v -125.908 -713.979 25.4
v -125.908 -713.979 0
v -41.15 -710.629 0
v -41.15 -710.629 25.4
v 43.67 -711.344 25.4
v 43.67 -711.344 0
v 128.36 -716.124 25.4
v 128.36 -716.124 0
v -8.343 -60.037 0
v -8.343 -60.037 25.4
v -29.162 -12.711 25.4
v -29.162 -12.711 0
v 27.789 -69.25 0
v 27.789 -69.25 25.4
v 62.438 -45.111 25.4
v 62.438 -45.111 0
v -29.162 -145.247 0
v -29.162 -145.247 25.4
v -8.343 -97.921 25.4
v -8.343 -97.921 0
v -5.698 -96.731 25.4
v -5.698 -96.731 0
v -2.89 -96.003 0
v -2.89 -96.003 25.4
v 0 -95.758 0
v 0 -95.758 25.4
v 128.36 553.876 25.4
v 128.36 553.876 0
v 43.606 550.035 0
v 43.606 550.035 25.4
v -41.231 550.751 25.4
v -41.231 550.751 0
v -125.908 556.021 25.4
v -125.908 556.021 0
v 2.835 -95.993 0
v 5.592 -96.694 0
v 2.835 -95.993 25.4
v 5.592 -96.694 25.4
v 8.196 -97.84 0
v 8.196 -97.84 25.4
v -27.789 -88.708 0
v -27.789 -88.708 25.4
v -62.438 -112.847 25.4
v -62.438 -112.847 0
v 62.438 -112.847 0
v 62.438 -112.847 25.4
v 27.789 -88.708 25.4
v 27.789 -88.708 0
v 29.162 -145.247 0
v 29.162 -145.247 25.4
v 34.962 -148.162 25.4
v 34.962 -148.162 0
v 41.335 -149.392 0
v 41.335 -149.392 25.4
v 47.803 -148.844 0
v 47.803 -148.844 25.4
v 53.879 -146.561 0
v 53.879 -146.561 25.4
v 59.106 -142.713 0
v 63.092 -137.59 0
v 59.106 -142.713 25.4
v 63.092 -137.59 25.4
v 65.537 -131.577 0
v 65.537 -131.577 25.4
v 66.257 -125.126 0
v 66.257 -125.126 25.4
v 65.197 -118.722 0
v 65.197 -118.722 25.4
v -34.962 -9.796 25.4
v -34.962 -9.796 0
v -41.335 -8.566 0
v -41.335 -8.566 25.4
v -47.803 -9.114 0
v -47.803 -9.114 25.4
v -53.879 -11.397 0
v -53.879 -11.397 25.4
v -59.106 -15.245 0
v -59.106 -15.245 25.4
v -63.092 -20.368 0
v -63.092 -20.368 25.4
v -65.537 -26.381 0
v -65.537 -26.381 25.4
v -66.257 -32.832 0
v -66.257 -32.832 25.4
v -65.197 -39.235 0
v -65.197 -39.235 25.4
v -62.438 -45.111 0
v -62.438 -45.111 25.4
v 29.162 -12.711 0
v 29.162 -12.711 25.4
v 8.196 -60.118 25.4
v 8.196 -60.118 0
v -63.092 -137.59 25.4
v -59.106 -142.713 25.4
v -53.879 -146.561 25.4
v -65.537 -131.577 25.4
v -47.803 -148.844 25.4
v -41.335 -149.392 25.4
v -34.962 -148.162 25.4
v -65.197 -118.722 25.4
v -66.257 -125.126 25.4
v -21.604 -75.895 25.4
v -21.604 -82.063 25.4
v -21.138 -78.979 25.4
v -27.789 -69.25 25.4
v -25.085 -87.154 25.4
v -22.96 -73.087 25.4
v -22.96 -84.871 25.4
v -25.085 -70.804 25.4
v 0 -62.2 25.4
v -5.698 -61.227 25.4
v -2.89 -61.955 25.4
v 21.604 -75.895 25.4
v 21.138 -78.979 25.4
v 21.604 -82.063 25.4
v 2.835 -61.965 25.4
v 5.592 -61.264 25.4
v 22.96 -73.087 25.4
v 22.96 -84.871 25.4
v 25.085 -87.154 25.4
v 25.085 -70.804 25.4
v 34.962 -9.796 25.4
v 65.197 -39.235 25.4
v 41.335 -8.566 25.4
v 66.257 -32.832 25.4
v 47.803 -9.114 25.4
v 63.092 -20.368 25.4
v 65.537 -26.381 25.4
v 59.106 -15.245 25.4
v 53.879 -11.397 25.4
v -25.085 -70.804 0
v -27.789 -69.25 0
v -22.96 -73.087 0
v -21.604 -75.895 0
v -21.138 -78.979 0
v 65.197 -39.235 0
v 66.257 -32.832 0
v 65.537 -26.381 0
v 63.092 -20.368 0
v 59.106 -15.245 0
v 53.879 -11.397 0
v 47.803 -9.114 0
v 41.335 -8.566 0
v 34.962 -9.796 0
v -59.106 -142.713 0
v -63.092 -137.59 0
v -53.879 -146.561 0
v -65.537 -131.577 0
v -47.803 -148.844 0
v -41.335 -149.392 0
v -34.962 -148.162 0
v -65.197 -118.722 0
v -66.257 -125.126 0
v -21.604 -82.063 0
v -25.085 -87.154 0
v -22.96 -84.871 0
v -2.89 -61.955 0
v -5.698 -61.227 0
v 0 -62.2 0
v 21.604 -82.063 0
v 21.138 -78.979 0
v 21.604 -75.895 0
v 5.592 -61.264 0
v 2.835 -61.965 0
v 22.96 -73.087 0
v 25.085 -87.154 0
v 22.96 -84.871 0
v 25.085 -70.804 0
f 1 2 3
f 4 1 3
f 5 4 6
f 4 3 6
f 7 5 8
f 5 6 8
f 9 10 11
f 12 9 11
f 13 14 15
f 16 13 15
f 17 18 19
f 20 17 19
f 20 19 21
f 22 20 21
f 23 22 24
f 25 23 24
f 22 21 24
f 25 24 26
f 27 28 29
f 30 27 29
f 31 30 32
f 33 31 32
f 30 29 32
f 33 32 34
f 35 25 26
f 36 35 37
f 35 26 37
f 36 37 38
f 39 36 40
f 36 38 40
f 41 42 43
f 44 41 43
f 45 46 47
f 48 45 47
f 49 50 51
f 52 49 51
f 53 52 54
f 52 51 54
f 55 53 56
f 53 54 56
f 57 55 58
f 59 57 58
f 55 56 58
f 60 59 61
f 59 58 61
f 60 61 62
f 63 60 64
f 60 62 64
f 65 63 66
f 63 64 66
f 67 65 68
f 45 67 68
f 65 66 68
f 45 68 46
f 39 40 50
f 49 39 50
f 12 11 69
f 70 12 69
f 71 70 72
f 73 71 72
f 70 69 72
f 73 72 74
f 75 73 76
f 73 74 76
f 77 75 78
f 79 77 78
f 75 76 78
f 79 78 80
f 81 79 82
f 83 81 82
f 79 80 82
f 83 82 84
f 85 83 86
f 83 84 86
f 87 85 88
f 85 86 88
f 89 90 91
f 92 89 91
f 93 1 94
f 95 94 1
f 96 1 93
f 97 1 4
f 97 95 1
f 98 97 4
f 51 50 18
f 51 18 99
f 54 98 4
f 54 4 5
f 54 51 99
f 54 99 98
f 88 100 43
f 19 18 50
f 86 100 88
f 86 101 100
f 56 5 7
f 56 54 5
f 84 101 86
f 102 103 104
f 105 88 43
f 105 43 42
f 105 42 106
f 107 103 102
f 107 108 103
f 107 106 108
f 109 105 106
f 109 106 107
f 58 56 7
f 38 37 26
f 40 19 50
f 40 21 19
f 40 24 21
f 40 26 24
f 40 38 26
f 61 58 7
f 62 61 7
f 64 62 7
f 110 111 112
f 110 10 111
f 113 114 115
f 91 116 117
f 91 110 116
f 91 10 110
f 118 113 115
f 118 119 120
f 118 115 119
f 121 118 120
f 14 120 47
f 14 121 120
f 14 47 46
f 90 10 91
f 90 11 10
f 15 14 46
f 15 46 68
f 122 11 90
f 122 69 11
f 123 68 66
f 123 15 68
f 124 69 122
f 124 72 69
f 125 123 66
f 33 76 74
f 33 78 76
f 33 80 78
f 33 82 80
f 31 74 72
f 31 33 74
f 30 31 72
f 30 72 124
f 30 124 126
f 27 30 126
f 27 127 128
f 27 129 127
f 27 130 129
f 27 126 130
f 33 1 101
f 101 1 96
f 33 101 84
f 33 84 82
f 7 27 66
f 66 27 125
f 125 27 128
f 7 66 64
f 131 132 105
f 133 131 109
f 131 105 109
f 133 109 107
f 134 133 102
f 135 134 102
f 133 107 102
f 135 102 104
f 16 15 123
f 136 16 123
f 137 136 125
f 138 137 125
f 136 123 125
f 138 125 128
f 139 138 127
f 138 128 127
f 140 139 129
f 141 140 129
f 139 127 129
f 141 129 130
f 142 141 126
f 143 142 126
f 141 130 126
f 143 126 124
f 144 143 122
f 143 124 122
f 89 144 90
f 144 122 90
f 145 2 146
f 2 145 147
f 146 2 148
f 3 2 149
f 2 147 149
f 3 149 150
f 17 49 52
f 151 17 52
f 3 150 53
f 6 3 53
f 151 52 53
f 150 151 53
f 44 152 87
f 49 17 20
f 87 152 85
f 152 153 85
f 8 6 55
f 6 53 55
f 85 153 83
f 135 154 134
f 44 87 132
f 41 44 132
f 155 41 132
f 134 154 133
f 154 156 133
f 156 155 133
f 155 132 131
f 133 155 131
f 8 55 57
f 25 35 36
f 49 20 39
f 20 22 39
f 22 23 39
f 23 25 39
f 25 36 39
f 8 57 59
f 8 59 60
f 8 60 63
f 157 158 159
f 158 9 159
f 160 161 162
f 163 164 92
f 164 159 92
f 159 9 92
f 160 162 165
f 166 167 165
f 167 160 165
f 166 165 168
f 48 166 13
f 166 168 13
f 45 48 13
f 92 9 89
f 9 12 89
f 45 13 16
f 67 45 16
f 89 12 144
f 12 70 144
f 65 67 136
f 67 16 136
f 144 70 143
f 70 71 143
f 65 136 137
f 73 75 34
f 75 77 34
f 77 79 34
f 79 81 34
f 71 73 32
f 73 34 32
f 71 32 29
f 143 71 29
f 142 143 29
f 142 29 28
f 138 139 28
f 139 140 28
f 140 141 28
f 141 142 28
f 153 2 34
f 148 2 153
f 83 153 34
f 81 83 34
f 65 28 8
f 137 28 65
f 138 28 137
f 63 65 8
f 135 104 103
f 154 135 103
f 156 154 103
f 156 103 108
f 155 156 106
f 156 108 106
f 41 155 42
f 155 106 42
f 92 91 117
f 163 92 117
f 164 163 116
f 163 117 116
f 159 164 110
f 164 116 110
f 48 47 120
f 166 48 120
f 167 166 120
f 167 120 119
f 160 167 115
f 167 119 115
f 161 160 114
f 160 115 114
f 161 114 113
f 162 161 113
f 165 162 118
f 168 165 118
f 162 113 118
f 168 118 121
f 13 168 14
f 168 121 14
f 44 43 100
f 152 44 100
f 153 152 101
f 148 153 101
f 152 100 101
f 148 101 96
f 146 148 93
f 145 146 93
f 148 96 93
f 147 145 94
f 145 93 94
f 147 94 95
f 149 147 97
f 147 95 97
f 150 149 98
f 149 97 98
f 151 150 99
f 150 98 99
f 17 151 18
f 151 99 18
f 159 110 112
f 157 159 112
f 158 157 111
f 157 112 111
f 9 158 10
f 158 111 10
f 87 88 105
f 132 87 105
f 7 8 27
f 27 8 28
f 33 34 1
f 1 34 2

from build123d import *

# Parameters (mm, degrees)
F1_DEPTH = 25.4
F3_DEPTH = 25.4
F4_DEPTH = 25.4


# Not quite as in the source:
# - a feature names something its author has since deleted; it is built from what else it names


with BuildPart() as f1:
    # F0 (on Top) → F1 (new body)
    with BuildSketch(Plane.XY):
        with BuildLine():
            ThreePointArc((128.3595710993, 553.8759422302), (1.1825358552, 549.8230168828), (-125.9080190212, 556.0210293531))
            Line((-125.9080190212, 556.0210293531), (-125.9080190212, -713.9789706469))
            ThreePointArc((-125.9080190212, -713.9789706469), (1.2643600135, -710.4779684085), (128.3595710993, -716.1240577698))
            Line((128.3595710993, -716.1240577698), (128.3595710993, 553.8759422302))
        make_face()
    extrude(amount=F1_DEPTH)

    # F2 (on face) → F3 (cut, through all)
    with BuildSketch(Plane.XY.offset(25.4)):
        with BuildLine():
            Line((21.1381499791, -78.9789706469), (0, -78.9789706469))
            Line((0, -78.9789706469), (0, -95.7576301918))
            ThreePointArc((0, -95.7576301918), (4.2283594629, -96.2864641581), (8.1962319091, -97.8403873742))
            Line((8.1962319091, -97.8403873742), (29.1618719602, -145.247048063))
            ThreePointArc((29.1618719602, -145.247048063), (59.1063769686, -142.7132397651), (62.4383196322, -112.8470092903))
            Line((62.4383196322, -112.8470092903), (27.7889794812, -88.7078500401))
            ThreePointArc((27.7889794812, -88.7078500401), (22.9597605864, -84.8714367544), (21.1381499791, -78.9789706469))
        make_face()
        with BuildLine():
            Line((0, -78.9789706469), (-21.1381499791, -78.9789706469))
            ThreePointArc((-21.1381499791, -78.9789706469), (-22.9597605864, -84.8714367544), (-27.7889794812, -88.7078500401))
            Line((-27.7889794812, -88.7078500401), (-62.4383196322, -112.8470092903))
            ThreePointArc((-62.4383196322, -112.8470092903), (-59.1063769686, -142.7132397651), (-29.1618719602, -145.247048063))
            Line((-29.1618719602, -145.247048063), (-8.3430390852, -97.9210786899))
            ThreePointArc((-8.3430390852, -97.9210786899), (-4.3094898358, -96.30729114), (0, -95.7576301918))
            Line((0, -95.7576301918), (0, -78.9789706469))
        make_face()
    extrude(amount=-F3_DEPTH, mode=Mode.SUBTRACT)

    # F2 (on face) → F4 (cut, through all)
    with BuildSketch(Plane.XY.offset(25.4)):
        with BuildLine():
            ThreePointArc((-27.7889794812, -69.2500912536), (-22.9597605864, -73.0865045393), (-21.1381499791, -78.9789706469))
            Line((-21.1381499791, -78.9789706469), (0, -78.9789706469))
            Line((0, -78.9789706469), (0, -62.2003111019))
            ThreePointArc((0, -62.2003111019), (-4.3094898358, -61.6506501538), (-8.3430390852, -60.0368626038))
            Line((-8.3430390852, -60.0368626038), (-29.1618719602, -12.7108932307))
            ThreePointArc((-29.1618719602, -12.7108932307), (-59.1063769686, -15.2447015287), (-62.4383196322, -45.1109320034))
            Line((-62.4383196322, -45.1109320034), (-27.7889794812, -69.2500912536))
        make_face()
        with BuildLine():
            Line((0, -62.2003111019), (0, -78.9789706469))
            Line((0, -78.9789706469), (21.1381499791, -78.9789706469))
            ThreePointArc((21.1381499791, -78.9789706469), (22.9597605864, -73.0865045393), (27.7889794812, -69.2500912536))
            Line((27.7889794812, -69.2500912536), (62.4383196322, -45.1109320034))
            ThreePointArc((62.4383196322, -45.1109320034), (59.1063769686, -15.2447015287), (29.1618719602, -12.7108932307))
            Line((29.1618719602, -12.7108932307), (8.1962319091, -60.1175539196))
            ThreePointArc((8.1962319091, -60.1175539196), (4.2283594629, -61.6714771356), (0, -62.2003111019))
        make_face()
    extrude(amount=-F4_DEPTH, mode=Mode.SUBTRACT)


solid = f1.part
